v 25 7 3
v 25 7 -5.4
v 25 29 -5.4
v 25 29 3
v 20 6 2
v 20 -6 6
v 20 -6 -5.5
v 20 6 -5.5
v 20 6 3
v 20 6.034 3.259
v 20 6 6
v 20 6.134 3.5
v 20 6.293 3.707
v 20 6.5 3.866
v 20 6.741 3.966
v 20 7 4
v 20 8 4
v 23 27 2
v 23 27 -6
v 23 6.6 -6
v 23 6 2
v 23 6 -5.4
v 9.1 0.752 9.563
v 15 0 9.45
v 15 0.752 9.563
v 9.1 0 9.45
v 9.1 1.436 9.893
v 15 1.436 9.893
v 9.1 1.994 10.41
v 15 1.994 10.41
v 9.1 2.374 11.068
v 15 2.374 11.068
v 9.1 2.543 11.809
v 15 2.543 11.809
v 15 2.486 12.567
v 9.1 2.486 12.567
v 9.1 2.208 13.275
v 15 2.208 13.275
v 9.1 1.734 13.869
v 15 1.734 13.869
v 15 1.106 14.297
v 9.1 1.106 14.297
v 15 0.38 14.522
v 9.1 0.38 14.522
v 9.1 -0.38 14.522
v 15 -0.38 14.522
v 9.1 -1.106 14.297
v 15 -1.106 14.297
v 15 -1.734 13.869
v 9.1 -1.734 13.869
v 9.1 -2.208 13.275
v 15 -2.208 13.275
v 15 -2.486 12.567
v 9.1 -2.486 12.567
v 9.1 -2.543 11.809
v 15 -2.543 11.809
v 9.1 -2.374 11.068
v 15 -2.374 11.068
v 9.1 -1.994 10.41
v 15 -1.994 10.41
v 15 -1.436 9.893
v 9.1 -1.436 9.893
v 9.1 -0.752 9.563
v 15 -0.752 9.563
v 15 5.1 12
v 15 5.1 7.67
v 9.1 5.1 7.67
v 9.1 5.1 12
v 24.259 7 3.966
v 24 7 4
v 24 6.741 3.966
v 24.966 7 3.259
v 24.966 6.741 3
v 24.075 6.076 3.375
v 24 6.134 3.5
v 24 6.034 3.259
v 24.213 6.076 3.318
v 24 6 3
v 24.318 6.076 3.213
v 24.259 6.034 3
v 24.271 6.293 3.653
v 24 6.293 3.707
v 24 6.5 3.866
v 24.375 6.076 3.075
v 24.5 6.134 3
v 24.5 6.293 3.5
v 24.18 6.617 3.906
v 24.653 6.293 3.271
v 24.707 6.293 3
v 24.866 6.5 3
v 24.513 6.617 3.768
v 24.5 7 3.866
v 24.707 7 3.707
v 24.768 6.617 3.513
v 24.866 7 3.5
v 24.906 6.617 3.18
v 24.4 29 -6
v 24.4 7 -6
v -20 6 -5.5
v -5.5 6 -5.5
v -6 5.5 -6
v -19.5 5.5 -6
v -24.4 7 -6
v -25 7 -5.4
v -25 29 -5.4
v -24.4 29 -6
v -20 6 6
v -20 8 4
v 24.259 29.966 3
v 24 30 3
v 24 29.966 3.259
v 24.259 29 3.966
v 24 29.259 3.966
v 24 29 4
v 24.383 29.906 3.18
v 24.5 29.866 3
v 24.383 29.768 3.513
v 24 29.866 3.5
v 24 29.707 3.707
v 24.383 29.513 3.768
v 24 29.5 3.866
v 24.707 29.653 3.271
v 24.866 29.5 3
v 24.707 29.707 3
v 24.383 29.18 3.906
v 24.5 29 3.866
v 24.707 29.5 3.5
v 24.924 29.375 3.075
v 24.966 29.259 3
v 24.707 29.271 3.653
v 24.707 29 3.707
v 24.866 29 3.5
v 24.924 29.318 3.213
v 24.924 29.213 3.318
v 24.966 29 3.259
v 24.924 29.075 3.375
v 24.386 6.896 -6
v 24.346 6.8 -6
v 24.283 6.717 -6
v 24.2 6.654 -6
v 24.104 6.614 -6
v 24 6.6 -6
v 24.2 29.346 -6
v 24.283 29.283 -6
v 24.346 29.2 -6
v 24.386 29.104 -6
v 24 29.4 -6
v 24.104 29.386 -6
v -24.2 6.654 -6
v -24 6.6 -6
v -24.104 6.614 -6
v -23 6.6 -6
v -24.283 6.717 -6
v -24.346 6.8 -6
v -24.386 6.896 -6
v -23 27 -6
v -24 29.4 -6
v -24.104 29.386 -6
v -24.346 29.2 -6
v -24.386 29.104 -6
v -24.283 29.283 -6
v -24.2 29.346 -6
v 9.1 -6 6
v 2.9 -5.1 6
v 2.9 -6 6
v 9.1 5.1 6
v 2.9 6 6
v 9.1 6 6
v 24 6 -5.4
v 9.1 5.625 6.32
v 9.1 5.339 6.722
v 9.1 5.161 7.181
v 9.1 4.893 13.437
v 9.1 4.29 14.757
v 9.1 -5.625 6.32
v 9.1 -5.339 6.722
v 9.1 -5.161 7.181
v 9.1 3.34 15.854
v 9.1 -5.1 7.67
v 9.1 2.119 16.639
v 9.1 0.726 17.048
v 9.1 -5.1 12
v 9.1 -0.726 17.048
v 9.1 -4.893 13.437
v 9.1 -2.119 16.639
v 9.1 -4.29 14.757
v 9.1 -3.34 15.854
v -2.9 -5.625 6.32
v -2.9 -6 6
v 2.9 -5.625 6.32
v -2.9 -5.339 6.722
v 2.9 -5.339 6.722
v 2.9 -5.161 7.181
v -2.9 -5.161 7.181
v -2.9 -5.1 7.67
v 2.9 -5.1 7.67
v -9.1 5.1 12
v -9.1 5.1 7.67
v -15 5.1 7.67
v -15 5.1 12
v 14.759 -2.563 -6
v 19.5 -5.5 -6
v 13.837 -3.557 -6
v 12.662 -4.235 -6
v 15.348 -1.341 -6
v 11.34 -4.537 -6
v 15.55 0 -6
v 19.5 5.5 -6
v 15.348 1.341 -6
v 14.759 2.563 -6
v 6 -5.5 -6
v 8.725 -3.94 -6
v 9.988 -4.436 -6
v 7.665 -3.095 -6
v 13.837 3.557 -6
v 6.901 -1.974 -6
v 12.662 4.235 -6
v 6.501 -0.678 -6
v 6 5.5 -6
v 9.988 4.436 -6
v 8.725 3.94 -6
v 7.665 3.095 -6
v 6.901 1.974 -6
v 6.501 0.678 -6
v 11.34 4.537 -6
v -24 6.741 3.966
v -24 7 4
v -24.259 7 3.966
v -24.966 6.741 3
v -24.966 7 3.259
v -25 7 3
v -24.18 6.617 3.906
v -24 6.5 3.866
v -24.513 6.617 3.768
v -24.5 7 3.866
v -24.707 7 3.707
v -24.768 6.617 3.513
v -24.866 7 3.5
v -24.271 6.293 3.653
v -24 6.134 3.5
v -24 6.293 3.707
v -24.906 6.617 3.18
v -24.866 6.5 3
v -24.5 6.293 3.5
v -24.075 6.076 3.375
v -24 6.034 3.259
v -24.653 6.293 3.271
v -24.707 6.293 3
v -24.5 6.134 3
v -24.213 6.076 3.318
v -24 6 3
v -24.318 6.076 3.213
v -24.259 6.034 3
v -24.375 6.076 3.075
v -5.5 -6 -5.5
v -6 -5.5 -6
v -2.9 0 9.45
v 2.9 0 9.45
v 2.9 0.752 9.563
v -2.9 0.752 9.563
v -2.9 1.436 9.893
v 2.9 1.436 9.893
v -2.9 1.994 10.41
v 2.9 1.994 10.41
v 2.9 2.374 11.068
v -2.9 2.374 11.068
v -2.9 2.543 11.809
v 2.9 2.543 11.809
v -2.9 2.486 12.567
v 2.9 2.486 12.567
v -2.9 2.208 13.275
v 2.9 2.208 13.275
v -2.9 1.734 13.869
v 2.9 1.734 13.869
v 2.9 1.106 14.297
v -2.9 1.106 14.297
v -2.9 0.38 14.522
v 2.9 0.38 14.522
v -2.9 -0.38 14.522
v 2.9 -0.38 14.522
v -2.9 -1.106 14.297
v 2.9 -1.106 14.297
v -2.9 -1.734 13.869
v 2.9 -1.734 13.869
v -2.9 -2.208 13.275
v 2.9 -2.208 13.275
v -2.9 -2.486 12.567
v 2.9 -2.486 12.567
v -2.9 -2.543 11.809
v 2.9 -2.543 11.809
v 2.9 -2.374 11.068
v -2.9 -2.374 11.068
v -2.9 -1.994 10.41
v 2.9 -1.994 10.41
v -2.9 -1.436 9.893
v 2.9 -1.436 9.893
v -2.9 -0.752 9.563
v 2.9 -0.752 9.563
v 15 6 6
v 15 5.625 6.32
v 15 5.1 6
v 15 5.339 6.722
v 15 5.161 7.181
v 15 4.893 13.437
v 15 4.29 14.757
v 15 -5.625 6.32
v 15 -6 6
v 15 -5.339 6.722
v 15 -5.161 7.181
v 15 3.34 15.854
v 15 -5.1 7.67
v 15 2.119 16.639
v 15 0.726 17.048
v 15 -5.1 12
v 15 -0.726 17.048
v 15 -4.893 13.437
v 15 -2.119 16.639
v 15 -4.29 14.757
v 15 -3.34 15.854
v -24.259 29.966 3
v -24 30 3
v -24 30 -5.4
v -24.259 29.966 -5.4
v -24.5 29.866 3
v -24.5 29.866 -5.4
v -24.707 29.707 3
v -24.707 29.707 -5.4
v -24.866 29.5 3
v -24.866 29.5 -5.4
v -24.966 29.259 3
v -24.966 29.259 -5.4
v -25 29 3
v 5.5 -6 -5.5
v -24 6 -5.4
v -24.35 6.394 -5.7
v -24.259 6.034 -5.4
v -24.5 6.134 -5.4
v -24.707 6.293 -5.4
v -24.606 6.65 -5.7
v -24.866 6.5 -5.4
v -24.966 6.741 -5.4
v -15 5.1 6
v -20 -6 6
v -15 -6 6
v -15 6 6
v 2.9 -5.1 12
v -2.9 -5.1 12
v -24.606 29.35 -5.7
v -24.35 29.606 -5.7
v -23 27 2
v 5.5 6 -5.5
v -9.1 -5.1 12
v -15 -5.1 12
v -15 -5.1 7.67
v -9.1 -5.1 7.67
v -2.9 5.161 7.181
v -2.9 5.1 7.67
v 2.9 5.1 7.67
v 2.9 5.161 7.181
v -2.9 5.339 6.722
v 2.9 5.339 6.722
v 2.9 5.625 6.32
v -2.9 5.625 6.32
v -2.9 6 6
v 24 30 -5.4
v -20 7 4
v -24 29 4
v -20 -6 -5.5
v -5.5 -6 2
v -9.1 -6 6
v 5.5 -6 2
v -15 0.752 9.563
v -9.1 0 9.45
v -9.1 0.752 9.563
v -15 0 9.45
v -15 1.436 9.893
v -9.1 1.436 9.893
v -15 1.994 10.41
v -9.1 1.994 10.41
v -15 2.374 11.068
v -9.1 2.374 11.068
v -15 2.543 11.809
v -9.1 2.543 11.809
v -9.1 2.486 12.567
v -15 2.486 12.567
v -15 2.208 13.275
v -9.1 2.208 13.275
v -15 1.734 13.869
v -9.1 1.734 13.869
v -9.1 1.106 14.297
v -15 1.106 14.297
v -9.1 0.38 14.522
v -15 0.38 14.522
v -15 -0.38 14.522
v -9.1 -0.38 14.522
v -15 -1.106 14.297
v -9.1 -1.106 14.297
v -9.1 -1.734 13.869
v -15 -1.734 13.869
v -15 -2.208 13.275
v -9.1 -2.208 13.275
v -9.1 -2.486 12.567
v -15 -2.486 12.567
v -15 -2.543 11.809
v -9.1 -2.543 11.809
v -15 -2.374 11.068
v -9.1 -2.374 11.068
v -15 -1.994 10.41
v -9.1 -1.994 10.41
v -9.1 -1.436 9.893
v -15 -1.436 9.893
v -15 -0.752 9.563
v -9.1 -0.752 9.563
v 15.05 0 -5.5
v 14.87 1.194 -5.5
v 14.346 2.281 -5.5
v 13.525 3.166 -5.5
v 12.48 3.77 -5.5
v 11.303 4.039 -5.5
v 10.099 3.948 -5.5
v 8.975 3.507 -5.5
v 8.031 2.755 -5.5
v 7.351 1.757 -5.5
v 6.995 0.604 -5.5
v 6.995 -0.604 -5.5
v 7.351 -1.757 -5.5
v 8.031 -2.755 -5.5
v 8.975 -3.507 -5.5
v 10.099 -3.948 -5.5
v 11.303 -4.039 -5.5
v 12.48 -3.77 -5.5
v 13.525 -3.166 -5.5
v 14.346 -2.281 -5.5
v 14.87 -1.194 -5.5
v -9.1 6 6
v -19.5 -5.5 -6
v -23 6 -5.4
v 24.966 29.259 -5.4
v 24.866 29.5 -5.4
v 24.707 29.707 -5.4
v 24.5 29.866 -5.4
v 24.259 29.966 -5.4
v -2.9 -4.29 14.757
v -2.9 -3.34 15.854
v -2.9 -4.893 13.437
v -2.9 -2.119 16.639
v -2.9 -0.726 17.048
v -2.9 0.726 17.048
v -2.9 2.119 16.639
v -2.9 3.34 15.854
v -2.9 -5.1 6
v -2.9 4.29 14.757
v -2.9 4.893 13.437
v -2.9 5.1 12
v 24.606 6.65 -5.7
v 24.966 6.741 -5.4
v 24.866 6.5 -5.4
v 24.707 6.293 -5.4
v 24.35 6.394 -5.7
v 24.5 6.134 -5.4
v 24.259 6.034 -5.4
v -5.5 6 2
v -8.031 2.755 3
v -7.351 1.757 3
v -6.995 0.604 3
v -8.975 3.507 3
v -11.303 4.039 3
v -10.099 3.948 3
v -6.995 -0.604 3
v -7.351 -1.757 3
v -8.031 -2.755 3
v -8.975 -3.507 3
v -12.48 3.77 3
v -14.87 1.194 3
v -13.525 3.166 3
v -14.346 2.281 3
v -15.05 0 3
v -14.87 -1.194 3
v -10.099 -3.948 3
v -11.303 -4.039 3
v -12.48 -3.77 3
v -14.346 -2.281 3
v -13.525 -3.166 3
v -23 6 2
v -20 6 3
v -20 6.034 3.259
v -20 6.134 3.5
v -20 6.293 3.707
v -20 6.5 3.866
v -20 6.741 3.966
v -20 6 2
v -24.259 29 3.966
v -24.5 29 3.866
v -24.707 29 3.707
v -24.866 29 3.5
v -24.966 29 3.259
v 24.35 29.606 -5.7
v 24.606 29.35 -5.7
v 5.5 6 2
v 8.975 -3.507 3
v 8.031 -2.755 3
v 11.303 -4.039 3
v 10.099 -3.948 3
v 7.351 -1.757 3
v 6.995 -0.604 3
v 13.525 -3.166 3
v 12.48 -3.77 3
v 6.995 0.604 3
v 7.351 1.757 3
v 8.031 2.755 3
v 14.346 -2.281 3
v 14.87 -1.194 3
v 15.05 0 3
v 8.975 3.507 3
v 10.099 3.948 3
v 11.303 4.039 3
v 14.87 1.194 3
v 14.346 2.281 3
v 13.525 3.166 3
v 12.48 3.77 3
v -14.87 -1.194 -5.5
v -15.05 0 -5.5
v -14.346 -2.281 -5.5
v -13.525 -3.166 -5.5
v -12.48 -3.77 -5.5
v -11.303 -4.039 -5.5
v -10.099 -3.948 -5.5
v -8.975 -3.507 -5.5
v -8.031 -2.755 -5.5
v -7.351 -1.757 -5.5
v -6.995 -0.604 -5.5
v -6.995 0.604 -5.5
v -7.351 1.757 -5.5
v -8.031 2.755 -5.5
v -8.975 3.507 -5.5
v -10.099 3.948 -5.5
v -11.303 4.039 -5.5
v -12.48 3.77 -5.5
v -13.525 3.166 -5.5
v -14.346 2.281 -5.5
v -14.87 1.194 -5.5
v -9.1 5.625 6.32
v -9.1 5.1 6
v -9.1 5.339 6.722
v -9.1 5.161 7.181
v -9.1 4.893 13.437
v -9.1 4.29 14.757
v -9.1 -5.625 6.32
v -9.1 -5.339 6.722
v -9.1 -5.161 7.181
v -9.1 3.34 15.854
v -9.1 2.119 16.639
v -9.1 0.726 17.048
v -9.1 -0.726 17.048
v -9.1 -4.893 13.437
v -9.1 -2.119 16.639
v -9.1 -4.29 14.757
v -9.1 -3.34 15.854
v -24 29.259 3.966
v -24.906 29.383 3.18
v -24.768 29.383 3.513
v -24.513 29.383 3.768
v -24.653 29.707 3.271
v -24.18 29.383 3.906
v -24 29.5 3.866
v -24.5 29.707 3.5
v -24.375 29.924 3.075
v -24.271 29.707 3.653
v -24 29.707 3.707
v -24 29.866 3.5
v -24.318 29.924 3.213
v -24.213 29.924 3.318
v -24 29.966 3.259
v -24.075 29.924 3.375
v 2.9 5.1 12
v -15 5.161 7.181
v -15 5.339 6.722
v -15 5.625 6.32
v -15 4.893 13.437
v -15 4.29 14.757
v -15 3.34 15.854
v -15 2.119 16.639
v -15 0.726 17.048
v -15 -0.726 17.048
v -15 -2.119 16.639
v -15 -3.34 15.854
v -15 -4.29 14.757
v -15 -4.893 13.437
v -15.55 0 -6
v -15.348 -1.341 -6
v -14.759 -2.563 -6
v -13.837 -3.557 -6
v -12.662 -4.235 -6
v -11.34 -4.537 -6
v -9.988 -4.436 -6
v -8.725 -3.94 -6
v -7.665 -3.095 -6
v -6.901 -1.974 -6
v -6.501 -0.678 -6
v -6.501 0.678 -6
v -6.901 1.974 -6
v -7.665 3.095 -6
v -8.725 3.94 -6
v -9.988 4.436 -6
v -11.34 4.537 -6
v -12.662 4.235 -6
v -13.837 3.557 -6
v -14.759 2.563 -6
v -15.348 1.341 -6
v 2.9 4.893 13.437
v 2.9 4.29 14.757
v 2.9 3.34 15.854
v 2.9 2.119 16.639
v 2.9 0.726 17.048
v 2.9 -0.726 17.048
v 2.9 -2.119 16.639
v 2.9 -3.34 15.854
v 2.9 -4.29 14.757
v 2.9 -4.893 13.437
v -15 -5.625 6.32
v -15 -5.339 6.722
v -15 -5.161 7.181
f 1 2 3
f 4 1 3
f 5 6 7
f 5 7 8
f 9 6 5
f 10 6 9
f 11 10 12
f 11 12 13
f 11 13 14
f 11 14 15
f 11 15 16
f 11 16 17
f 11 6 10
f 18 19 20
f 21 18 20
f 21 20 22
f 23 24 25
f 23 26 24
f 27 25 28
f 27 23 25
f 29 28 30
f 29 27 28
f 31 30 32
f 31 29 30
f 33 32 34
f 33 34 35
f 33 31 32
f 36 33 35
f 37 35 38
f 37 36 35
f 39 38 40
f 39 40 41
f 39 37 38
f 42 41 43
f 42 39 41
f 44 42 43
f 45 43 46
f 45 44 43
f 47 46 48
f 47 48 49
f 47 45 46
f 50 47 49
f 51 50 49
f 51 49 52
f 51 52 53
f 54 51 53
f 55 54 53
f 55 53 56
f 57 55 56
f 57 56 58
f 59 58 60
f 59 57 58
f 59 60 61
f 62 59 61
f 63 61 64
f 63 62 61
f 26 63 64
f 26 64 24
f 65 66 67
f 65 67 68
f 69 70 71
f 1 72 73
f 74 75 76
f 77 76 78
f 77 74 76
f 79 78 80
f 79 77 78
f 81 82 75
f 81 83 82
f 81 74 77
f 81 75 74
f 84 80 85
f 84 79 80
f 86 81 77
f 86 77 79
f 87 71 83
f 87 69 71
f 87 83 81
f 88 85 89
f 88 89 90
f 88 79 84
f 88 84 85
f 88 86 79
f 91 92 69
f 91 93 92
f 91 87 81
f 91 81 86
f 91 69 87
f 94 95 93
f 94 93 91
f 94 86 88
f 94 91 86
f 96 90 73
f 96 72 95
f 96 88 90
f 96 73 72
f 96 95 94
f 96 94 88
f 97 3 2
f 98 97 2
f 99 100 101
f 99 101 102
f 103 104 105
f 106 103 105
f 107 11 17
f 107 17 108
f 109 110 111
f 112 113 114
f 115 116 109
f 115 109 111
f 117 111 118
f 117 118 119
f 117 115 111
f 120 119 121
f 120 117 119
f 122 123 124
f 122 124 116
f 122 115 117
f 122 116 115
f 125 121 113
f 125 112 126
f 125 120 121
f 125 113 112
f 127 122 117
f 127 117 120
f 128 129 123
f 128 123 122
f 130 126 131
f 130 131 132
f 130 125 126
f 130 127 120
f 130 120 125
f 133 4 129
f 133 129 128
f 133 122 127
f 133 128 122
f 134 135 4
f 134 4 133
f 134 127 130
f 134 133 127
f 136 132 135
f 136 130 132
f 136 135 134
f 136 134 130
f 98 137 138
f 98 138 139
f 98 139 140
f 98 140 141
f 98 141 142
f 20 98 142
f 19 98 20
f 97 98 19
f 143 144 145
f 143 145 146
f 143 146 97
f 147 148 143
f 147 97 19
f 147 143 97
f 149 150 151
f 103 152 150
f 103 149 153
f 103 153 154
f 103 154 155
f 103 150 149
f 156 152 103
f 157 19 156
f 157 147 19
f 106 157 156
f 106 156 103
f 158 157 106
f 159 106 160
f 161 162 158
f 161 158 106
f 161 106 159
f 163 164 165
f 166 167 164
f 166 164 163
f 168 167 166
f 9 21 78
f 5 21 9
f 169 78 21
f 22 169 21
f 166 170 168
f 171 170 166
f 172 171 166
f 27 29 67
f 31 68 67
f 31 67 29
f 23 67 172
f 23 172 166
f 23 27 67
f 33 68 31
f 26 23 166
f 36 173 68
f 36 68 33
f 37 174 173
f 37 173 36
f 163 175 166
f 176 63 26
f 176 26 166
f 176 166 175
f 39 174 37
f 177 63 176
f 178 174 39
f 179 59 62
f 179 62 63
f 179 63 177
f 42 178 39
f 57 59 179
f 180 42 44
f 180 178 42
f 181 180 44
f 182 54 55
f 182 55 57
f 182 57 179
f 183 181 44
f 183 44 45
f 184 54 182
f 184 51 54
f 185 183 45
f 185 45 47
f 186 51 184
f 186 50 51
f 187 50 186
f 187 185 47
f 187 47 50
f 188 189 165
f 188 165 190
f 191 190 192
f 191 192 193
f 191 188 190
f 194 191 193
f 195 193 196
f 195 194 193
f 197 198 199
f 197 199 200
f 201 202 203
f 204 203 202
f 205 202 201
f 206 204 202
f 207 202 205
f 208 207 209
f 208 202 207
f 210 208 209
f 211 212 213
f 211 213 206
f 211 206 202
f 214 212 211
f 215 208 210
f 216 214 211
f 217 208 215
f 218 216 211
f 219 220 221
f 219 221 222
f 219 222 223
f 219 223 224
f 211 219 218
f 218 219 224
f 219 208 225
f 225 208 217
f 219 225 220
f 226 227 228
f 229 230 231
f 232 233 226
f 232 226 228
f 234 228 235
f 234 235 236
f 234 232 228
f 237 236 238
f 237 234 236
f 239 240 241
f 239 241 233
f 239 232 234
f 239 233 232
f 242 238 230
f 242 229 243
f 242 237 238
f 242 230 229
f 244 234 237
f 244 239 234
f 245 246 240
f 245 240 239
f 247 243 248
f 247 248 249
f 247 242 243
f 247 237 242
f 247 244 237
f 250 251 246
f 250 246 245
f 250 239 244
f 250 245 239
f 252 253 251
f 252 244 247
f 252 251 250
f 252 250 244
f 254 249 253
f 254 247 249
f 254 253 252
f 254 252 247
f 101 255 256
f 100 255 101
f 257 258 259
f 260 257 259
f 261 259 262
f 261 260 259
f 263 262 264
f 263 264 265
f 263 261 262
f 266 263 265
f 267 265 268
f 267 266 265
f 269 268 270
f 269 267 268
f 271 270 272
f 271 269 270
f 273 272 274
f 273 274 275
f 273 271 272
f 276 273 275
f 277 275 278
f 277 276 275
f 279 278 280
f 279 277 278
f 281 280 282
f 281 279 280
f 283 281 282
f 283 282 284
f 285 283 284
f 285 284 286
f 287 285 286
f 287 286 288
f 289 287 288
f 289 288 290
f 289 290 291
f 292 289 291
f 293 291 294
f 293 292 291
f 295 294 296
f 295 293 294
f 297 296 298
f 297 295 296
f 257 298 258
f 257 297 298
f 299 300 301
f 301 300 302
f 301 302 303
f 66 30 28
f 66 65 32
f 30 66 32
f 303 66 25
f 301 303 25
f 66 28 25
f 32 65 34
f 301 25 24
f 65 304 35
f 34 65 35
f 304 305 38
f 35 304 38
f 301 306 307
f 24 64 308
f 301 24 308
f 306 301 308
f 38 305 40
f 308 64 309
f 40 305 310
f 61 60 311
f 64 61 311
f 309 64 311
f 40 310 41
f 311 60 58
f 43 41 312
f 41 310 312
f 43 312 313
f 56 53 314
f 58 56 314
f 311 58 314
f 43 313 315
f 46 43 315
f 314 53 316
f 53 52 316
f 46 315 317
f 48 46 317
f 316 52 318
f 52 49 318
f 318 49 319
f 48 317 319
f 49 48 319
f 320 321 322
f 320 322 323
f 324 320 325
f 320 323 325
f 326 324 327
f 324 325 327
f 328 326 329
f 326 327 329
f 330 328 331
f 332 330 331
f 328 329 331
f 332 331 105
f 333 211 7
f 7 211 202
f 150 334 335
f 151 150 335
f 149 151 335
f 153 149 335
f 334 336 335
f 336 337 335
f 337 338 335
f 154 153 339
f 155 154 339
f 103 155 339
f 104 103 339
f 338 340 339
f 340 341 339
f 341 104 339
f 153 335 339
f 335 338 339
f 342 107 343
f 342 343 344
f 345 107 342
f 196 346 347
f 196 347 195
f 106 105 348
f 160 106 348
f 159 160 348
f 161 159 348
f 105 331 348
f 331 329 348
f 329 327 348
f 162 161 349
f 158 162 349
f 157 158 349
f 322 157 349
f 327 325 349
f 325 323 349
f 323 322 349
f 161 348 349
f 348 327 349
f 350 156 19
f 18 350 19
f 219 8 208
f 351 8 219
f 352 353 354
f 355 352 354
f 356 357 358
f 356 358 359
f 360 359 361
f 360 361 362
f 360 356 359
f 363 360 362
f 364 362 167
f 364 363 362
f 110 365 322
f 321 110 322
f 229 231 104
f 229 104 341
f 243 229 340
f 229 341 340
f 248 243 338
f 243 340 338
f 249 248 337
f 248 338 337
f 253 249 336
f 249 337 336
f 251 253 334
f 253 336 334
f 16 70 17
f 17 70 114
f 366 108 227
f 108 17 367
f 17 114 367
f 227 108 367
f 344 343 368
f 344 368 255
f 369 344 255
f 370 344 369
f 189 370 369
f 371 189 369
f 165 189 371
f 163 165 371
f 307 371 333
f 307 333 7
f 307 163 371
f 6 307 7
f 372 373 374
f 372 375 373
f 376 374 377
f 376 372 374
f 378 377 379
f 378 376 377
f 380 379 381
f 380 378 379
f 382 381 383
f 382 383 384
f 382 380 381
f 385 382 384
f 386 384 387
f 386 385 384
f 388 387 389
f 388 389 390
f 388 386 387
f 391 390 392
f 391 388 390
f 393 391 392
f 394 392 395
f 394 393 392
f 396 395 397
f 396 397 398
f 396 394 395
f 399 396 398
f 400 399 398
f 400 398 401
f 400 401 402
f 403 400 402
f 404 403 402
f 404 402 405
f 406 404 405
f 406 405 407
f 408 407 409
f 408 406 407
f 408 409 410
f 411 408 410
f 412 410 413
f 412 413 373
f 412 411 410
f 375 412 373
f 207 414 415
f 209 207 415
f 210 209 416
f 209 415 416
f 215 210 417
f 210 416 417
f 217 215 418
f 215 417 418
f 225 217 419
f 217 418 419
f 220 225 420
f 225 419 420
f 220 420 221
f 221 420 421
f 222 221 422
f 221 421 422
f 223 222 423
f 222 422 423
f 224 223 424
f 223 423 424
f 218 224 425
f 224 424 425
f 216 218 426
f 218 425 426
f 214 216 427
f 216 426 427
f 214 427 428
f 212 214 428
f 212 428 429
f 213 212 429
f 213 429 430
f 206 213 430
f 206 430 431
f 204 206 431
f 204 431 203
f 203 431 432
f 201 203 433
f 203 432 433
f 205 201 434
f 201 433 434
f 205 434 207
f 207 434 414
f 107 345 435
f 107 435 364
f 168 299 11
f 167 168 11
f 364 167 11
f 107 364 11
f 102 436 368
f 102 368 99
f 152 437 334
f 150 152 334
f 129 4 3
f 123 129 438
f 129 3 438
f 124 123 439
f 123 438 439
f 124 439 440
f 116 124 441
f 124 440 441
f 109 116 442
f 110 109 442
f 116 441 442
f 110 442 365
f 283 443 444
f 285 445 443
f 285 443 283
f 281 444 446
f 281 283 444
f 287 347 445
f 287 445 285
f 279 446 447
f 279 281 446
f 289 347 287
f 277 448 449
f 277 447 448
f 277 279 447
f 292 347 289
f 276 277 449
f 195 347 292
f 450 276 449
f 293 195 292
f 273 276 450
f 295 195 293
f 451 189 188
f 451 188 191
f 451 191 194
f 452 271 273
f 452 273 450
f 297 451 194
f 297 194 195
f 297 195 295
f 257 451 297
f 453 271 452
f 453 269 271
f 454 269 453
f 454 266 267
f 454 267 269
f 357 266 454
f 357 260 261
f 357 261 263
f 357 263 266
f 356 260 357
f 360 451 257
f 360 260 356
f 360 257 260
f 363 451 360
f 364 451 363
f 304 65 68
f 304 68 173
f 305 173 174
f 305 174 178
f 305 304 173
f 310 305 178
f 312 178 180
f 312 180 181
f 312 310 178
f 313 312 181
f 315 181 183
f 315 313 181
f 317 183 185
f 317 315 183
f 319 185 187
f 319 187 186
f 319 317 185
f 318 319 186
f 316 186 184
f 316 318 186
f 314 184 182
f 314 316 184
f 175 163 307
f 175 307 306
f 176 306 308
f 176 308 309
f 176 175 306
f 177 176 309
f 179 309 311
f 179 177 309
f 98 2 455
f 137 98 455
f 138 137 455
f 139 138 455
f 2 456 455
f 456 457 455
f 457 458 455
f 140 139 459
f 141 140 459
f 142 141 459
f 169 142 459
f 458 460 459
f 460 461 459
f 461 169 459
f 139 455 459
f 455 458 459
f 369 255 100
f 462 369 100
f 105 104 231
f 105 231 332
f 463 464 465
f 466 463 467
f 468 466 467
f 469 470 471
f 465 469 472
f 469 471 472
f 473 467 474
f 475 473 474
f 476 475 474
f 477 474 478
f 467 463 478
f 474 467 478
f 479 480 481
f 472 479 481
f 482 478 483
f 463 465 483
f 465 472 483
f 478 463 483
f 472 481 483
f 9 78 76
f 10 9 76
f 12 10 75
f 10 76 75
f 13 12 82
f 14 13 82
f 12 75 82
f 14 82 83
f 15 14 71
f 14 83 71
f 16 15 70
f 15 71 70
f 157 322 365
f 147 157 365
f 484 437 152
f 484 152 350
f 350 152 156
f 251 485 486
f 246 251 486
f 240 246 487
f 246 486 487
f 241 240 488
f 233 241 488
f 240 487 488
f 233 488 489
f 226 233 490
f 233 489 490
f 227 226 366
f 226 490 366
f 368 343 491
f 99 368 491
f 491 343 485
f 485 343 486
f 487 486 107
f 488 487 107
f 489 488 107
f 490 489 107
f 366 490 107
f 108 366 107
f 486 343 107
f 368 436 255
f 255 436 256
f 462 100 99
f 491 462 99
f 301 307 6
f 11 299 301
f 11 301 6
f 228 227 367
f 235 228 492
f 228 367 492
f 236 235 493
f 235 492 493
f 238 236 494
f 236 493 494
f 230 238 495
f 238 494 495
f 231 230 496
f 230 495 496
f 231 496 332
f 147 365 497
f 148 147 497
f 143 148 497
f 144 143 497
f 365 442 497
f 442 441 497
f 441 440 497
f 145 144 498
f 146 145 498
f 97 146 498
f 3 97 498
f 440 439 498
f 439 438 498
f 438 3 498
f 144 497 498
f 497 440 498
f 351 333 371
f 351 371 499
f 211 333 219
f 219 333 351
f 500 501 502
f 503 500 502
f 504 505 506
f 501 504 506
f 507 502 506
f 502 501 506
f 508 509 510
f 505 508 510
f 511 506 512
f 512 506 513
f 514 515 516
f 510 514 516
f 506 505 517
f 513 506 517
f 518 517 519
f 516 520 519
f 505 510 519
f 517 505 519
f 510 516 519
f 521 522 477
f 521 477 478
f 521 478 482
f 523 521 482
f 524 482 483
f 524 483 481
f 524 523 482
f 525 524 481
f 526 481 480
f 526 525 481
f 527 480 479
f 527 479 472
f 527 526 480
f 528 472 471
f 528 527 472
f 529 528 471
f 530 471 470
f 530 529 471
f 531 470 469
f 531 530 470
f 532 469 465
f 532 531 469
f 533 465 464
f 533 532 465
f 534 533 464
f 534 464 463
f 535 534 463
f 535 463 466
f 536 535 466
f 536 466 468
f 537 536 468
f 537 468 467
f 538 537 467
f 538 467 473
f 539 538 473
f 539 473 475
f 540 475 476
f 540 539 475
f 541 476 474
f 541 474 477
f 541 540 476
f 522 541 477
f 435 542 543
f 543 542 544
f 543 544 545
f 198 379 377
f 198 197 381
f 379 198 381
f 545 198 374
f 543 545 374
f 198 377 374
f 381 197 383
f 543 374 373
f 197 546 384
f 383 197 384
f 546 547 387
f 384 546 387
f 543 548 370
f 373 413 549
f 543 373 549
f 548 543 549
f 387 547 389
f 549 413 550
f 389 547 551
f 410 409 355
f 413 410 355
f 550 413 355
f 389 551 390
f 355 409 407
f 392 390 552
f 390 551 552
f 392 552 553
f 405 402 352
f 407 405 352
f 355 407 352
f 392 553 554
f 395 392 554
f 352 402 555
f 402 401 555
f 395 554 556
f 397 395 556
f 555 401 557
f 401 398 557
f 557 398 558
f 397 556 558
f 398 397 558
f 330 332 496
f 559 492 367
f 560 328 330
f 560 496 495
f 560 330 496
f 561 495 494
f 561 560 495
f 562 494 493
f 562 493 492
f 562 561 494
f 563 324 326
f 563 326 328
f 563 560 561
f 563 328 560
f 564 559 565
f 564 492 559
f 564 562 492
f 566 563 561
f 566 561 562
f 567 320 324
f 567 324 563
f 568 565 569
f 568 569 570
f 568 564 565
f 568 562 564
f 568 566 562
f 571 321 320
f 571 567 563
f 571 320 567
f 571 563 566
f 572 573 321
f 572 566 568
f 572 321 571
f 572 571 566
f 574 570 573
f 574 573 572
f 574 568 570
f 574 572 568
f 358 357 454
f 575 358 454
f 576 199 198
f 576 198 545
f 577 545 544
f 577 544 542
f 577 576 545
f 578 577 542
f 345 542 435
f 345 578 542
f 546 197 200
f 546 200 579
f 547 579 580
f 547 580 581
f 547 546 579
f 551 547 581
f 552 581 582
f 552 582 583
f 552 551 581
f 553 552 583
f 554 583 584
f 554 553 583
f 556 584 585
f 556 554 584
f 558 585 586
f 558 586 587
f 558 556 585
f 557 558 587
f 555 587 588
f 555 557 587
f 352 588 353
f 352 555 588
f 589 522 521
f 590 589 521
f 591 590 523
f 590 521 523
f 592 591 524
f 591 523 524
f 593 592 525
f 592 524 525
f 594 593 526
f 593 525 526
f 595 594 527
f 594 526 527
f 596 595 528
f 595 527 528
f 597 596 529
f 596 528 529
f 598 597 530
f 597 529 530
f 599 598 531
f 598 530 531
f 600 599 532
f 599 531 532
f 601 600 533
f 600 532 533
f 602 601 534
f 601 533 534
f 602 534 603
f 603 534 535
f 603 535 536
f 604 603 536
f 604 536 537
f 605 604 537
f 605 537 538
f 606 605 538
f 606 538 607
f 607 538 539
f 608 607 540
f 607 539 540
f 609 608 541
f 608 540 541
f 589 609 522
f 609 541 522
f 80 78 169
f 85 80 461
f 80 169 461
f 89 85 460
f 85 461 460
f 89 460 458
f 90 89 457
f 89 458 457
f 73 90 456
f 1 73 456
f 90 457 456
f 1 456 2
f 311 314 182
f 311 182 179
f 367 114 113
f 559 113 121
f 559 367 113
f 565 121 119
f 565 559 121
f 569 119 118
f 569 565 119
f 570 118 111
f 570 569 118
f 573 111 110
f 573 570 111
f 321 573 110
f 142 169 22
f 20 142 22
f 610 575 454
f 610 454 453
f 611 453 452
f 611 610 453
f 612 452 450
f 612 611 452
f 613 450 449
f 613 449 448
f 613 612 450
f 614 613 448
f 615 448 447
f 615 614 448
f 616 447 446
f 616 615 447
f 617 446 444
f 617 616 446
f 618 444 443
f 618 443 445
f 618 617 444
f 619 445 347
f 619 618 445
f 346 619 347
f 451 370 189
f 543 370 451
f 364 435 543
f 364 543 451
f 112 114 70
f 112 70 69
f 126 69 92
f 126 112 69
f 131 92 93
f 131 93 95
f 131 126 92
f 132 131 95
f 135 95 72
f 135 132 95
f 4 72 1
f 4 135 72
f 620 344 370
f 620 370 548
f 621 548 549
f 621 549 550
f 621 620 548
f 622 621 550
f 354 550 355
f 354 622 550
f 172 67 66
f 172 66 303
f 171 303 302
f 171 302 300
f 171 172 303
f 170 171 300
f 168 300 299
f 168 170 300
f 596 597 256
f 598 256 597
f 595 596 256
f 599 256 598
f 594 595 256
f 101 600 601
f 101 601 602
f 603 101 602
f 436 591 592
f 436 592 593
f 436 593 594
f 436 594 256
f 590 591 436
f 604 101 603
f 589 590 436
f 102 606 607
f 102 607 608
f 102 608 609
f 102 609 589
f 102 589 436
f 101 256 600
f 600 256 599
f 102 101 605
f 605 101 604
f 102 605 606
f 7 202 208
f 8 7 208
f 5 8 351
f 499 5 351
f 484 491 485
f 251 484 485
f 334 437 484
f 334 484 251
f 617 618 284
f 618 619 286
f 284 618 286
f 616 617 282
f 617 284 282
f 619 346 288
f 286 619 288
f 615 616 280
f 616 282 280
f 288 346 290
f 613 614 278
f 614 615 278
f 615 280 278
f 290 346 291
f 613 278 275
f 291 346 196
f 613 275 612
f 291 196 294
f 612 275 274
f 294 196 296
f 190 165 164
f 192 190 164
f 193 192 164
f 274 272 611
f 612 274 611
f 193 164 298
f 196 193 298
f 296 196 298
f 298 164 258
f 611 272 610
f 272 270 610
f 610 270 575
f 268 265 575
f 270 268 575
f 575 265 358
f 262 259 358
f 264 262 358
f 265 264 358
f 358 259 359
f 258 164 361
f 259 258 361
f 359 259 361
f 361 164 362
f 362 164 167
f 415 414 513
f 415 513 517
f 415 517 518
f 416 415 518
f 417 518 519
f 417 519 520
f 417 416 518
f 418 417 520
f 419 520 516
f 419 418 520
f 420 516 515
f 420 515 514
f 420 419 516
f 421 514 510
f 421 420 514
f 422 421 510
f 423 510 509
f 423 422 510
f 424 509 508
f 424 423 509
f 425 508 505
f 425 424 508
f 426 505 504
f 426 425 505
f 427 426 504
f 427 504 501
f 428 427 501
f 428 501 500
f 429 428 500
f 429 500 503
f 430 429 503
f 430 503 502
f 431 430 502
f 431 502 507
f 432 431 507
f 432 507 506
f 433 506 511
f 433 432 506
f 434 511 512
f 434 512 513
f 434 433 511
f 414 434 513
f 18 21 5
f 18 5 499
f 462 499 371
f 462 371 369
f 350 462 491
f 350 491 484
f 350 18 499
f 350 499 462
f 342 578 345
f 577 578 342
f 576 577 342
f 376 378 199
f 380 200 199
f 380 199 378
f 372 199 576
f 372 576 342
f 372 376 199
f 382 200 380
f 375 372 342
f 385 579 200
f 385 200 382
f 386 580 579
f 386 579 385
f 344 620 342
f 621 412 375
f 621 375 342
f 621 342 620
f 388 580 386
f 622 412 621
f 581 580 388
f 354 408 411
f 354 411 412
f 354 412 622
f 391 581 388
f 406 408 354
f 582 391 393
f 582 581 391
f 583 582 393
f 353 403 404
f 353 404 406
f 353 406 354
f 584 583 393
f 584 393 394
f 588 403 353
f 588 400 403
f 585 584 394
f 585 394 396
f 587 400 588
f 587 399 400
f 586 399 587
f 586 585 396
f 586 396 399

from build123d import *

# Parameters (mm, degrees)
SKETCH1_W           = 40
SKETCH1_H           = 12
SKETCH1_R           = 4.05
BOSS_EXTRUDE1_DEPTH = 6
SKETCH3_R           = 2.55
BOSS_EXTRUDE2_DEPTH = 15
CUT_EXTRUDE1_START  = -2.9
SKETCH3_2_R         = 2.55
CUT_EXTRUDE1_DEPTH  = 6.2
BOSS_EXTRUDE3_START = -3
SKETCH5_R           = 4.05
BOSS_EXTRUDE3_DEPTH = 3
SKETCH6_W           = 50
SKETCH6_H           = 24
BOSS_EXTRUDE4_DEPTH = 10
SKETCH8_W           = 11
SKETCH8_H           = 12
CUT_EXTRUDE2_DEPTH  = 8
CHAMFER1_SIZE       = 2
FILLET1_R           = 1
FILLET2_R           = 1
CHAMFER2_SIZE       = 0.6
CHAMFER3_SIZE       = 0.5
FILLET3_R           = 2


# Some blends are built 0.0001 mm under size
with BuildPart() as part:
    # Sketch1 → Boss-Extrude1 (new, symmetric)
    with BuildSketch(Plane.XY):
        Rectangle(SKETCH1_W, SKETCH1_H)
        with Locations((11, 0)):
            Circle(SKETCH1_R, mode=Mode.SUBTRACT)
        with Locations(Location((-11, 0, 0), (0, 0, 180))):
            Circle(SKETCH1_R, mode=Mode.SUBTRACT)
    extrude(amount=BOSS_EXTRUDE1_DEPTH, both=True)

    # Sketch3 → Boss-Extrude2 (add, symmetric)
    with BuildSketch(Plane(origin=(0, 0, 0), x_dir=(0, 0, -1), z_dir=(1, 0, 0))):
        with BuildLine():
            Line((-12, -5.1), (-6, -5.1))
            Line((-6, -5.1), (-6, 5.1))
            Line((-6, 5.1), (-12, 5.1))
            ThreePointArc((-12, 5.1), (-17.1, 0), (-12, -5.1))
        make_face()
        with Locations((-12, 0)):
            Circle(SKETCH3_R, mode=Mode.SUBTRACT)
    extrude(amount=BOSS_EXTRUDE2_DEPTH, both=True)

    # Sketch3<2> → Cut-Extrude1 (cut)
    with BuildSketch(Plane(origin=(0, 0, 0), x_dir=(0, 0, -1), z_dir=(1, 0, 0)).offset(CUT_EXTRUDE1_START)):
        with BuildLine():
            Line((-12, -5.1), (-6, -5.1))
            Line((-6, -5.1), (-6, 5.1))
            Line((-6, 5.1), (-12, 5.1))
            ThreePointArc((-12, 5.1), (-17.1, 0), (-12, -5.1))
        make_face()
        with Locations((-12, 0)):
            Circle(SKETCH3_2_R, mode=Mode.SUBTRACT)
    cut_extrude1 = extrude(amount=-CUT_EXTRUDE1_DEPTH, mode=Mode.SUBTRACT)

    # Mirror1: Cut-Extrude1 across plane
    add(cut_extrude1.mirror(Plane(origin=(0, 0, 0), x_dir=(0, 0, 1), z_dir=(1, 0, 0))), mode=Mode.SUBTRACT)

    # Sketch5 → Boss-Extrude3 (add)
    with BuildSketch(Plane.XY.offset(6).offset(BOSS_EXTRUDE3_START)):
        with Locations(Location((-11, 0, 0), (0, 0, 180))):
            Circle(SKETCH5_R)
        with Locations((11, 0)):
            Circle(SKETCH5_R)
    extrude(amount=BOSS_EXTRUDE3_DEPTH)

    # Sketch6 → Boss-Extrude4 (add)
    with BuildSketch(Plane(origin=(0, 0, -6), x_dir=(-1, 0, 0), z_dir=(0, 0, -1))):
        with Locations((0, 18)):
            Rectangle(SKETCH6_W, SKETCH6_H)
    extrude(amount=-BOSS_EXTRUDE4_DEPTH)

    # Sketch8 → Cut-Extrude2 (cut)
    with BuildSketch(Plane(origin=(0, 0, -6), x_dir=(-1, 0, 0), z_dir=(0, 0, -1))):
        Rectangle(SKETCH8_W, SKETCH8_H)
        Polygon((-23, 27), (-23, 6), (-20, 6), (-5.5, 6), (5.5, 6), (20, 6), (23, 6), (23, 27), align=None)
    extrude(amount=-CUT_EXTRUDE2_DEPTH, mode=Mode.SUBTRACT)

    # Chamfer1
    chamfer1_edges = [part.edges().sort_by_distance(p)[0] for p in [
        (0, 6, 4),
    ]]
    chamfer(chamfer1_edges, length=CHAMFER1_SIZE - 0.0001)  # a hair under: the kernel refuses the full size

    # Fillet1
    fillet1_edges = [part.edges().sort_by_distance(p)[0] for p in [
        (25, 18, 4),
        (0, 30, 4),
        (-25, 18, 4),
    ]]
    fillet(fillet1_edges, radius=FILLET1_R)

    # Fillet2
    # the kernel refuses this fillet: 1 mm, written as the material it takes off along each edge
    with BuildSketch(Plane(origin=(24, 29, 3), x_dir=(0, 1, 0), z_dir=(1, 0, 0))) as fillet2_piece_1_section:
        Polygon((0, 0), (FILLET2_R, 0), (FILLET2_R, FILLET2_R), (0, FILLET2_R), align=None)
    fillet2_piece_1 = extrude(amount=FILLET2_R, mode=Mode.PRIVATE)
    fillet2_piece_1 = fillet2_piece_1 - Plane(origin=(24, 29, 3), x_dir=(0, -0.7071067811865475, -0.7071067811865475), z_dir=(1, 0, 0)) * Sphere(FILLET2_R, mode=Mode.PRIVATE)
    add(fillet2_piece_1, mode=Mode.SUBTRACT)
    with BuildSketch(Plane(origin=(-24, 29, 3), x_dir=(-1, 0, 0), z_dir=(0, 1, 0))) as fillet2_piece_2_section:
        Polygon((0, 0), (FILLET2_R, 0), (FILLET2_R, FILLET2_R), (0, FILLET2_R), align=None)
    fillet2_piece_2 = extrude(amount=FILLET2_R, mode=Mode.PRIVATE)
    fillet2_piece_2 = fillet2_piece_2 - Plane(origin=(-24, 29, 3), x_dir=(0.7071067811865475, 0, -0.7071067811865475), z_dir=(0, 1, 0)) * Sphere(FILLET2_R, mode=Mode.PRIVATE)
    add(fillet2_piece_2, mode=Mode.SUBTRACT)
    with BuildSketch(Plane(origin=(-20, 6, 4), x_dir=(0, 1, 0), z_dir=(-1, 0, 0)), Plane(origin=(24, 6, 4), x_dir=(0, 1, 0), z_dir=(-1, 0, 0))) as fillet2_piece_3:
        with BuildLine():
            CenterArc((FILLET2_R, FILLET2_R), FILLET2_R, 180, 90)
            Line((0, FILLET2_R), (0, 0))
            Line((0, 0), (FILLET2_R, 0))
        make_face()
    extrude(amount=4, mode=Mode.SUBTRACT)
    with BuildSketch(Plane(origin=(-25, 6, -8.5), x_dir=(1, 0, 0), z_dir=(0, 0, 1))) as fillet2_piece_4:
        with BuildLine():
            CenterArc((FILLET2_R, FILLET2_R), FILLET2_R, 180, 90)
            Line((0, FILLET2_R), (0, 0))
            Line((0, 0), (FILLET2_R, 0))
        make_face()
    extrude(amount=11.5, mode=Mode.SUBTRACT)
    with BuildSketch(Plane(origin=(-25, 30, -8.5), x_dir=(1, 0, 0), z_dir=(0, 0, 1)), Plane(origin=(25, 30, -8.5), x_dir=(0, -1, 0), z_dir=(0, 0, 1)), Plane(origin=(25, 6, -8.5), x_dir=(-1, 0, 0), z_dir=(0, 0, 1))) as fillet2_piece_5:
        with BuildLine():
            CenterArc((FILLET2_R, -FILLET2_R), FILLET2_R, 90, 90)
            Line((0, -FILLET2_R), (0, 0))
            Line((0, 0), (FILLET2_R, 0))
        make_face()
    extrude(amount=11.5, mode=Mode.SUBTRACT)
    with BuildSketch(Plane(origin=(-24, 6, 3), x_dir=(0, 0, 1), z_dir=(1, 0, 0))) as fillet2_piece_6:
        with BuildLine():
            CenterArc((1 - FILLET2_R, -FILLET2_R), FILLET2_R, 0, 90)
            Line((1 - FILLET2_R, 0), (1, 0))
            Line((1, 0), (1, -FILLET2_R))
        make_face()
    revolve(axis=Axis((-24, 6, 3), (0, -1, 0)), revolution_arc=90, mode=Mode.SUBTRACT)
    with BuildSketch(Plane(origin=(24, 6, 3), x_dir=(0, 0, 1), z_dir=(-1, 0, 0))) as fillet2_piece_7:
        with BuildLine():
            CenterArc((1 - FILLET2_R, FILLET2_R), FILLET2_R, 270, 90)
            Line((1, FILLET2_R), (1, 0))
            Line((1, 0), (1 - FILLET2_R, 0))
        make_face()
    revolve(axis=Axis((24, 6, 3), (0, 1, 0)), revolution_arc=90, mode=Mode.SUBTRACT)

    # Chamfer2
    chamfer2_edges = [part.edges().sort_by_distance(p)[0] for p in [
        (-23.5, 6, -6),
        (23.5, 6, -6),
        (-25, 18, -6),
        (0, 30, -6),
        (25, 18, -6),
        (24.707106781, 29.707106781, -6),
        (-24.707106781, 29.707106781, -6),
        (24.707106781, 6.292893219, -6),
        (-24.707106781, 6.292893219, -6),
    ]]
    chamfer(chamfer2_edges, length=CHAMFER2_SIZE)

    # Chamfer3
    chamfer3_edges = [part.edges().sort_by_distance(p)[0] for p in [
        (12.75, -6, -6),
        (6.95, 0, -6),
        (-5.5, 0, -6),
        (-12.75, 6, -6),
        (12.75, 6, -6),
        (5.5, 0, -6),
        (-6.95, 0, -6),
        (-12.75, -6, -6),
        (-20, 0, -6),
        (20, 0, -6),
    ]]
    chamfer(chamfer3_edges, length=CHAMFER3_SIZE)

    # Fillet3
    # the kernel refuses this fillet: 2 mm, written as the material it adds along each edge
    with BuildSketch(Plane(origin=(9.1, -5.1, 6), x_dir=(0, -1.0, 1.5355618011688864e-12), z_dir=(1, 0, 0)), Plane(origin=(-15, -5.1, 6), x_dir=(0, -1.0, 1.5355618011688864e-12), z_dir=(1, 0, 0))) as fillet3_piece_1:
        with BuildLine():
            CenterArc((2, -1.670329309), FILLET3_R, 123.367012969, 56.632987031)
            Line((0, -1.670329309), (-0.04, -1.670329309))
            Line((-0.04, -1.670329309), (-0.04, 0))
            Line((-0.04, 0), (0, 0.04))
            ThreePointArc((0, 0.04), (0.45, 0.04), (0.878, 0.033406586))
            Line((0.878, 0.033406586), (0.9, 0))
        make_face()
    extrude(amount=5.9)
    with BuildSketch(Plane(origin=(9.1, 5.1, 6), x_dir=(0, 1.0, 1.5326012064365571e-12), z_dir=(1, 0, 0)), Plane(origin=(-15, 5.1, 6), x_dir=(0, 1.0, 1.5326012064365571e-12), z_dir=(1, 0, 0))) as fillet3_piece_2:
        with BuildLine():
            CenterArc((2, 1.670329309), FILLET3_R, 180, 56.632987031)
            Line((0, 1.670329309), (-0.04, 1.670329309))
            Line((-0.04, 1.670329309), (-0.04, 0))
            Line((-0.04, 0), (0, -0.04))
            ThreePointArc((0, -0.04), (0.45, -0.04), (0.878, -0.033406586))
            Line((0.878, -0.033406586), (0.9, 0))
        make_face()
    extrude(amount=5.9)
    with BuildSketch(Plane(origin=(-2.9, 5.1, 6), x_dir=(0, 1.0, 1.5326012064365571e-12), z_dir=(1, 0, 0))) as fillet3_piece_3:
        with BuildLine():
            CenterArc((2, 1.670329309), FILLET3_R, 180, 56.632987031)
            Line((0, 1.670329309), (-0.04, 1.670329309))
            Line((-0.04, 1.670329309), (-0.04, 0))
            Line((-0.04, 0), (0, -0.04))
            ThreePointArc((0, -0.04), (0.45, -0.04), (0.878, -0.033406586))
            Line((0.878, -0.033406586), (0.9, 0))
        make_face()
    extrude(amount=5.8)
    with BuildSketch(Plane(origin=(-2.9, -5.1, 6), x_dir=(0, -1.0, 1.5355618011688864e-12), z_dir=(1, 0, 0))) as fillet3_piece_4:
        with BuildLine():
            CenterArc((2, -1.670329309), FILLET3_R, 123.367012969, 56.632987031)
            Line((0, -1.670329309), (-0.04, -1.670329309))
            Line((-0.04, -1.670329309), (-0.04, 0))
            Line((-0.04, 0), (0, 0.04))
            ThreePointArc((0, 0.04), (0.45, 0.04), (0.878, 0.033406586))
            Line((0.878, 0.033406586), (0.9, 0))
        make_face()
    extrude(amount=5.8)


solid = part.part
